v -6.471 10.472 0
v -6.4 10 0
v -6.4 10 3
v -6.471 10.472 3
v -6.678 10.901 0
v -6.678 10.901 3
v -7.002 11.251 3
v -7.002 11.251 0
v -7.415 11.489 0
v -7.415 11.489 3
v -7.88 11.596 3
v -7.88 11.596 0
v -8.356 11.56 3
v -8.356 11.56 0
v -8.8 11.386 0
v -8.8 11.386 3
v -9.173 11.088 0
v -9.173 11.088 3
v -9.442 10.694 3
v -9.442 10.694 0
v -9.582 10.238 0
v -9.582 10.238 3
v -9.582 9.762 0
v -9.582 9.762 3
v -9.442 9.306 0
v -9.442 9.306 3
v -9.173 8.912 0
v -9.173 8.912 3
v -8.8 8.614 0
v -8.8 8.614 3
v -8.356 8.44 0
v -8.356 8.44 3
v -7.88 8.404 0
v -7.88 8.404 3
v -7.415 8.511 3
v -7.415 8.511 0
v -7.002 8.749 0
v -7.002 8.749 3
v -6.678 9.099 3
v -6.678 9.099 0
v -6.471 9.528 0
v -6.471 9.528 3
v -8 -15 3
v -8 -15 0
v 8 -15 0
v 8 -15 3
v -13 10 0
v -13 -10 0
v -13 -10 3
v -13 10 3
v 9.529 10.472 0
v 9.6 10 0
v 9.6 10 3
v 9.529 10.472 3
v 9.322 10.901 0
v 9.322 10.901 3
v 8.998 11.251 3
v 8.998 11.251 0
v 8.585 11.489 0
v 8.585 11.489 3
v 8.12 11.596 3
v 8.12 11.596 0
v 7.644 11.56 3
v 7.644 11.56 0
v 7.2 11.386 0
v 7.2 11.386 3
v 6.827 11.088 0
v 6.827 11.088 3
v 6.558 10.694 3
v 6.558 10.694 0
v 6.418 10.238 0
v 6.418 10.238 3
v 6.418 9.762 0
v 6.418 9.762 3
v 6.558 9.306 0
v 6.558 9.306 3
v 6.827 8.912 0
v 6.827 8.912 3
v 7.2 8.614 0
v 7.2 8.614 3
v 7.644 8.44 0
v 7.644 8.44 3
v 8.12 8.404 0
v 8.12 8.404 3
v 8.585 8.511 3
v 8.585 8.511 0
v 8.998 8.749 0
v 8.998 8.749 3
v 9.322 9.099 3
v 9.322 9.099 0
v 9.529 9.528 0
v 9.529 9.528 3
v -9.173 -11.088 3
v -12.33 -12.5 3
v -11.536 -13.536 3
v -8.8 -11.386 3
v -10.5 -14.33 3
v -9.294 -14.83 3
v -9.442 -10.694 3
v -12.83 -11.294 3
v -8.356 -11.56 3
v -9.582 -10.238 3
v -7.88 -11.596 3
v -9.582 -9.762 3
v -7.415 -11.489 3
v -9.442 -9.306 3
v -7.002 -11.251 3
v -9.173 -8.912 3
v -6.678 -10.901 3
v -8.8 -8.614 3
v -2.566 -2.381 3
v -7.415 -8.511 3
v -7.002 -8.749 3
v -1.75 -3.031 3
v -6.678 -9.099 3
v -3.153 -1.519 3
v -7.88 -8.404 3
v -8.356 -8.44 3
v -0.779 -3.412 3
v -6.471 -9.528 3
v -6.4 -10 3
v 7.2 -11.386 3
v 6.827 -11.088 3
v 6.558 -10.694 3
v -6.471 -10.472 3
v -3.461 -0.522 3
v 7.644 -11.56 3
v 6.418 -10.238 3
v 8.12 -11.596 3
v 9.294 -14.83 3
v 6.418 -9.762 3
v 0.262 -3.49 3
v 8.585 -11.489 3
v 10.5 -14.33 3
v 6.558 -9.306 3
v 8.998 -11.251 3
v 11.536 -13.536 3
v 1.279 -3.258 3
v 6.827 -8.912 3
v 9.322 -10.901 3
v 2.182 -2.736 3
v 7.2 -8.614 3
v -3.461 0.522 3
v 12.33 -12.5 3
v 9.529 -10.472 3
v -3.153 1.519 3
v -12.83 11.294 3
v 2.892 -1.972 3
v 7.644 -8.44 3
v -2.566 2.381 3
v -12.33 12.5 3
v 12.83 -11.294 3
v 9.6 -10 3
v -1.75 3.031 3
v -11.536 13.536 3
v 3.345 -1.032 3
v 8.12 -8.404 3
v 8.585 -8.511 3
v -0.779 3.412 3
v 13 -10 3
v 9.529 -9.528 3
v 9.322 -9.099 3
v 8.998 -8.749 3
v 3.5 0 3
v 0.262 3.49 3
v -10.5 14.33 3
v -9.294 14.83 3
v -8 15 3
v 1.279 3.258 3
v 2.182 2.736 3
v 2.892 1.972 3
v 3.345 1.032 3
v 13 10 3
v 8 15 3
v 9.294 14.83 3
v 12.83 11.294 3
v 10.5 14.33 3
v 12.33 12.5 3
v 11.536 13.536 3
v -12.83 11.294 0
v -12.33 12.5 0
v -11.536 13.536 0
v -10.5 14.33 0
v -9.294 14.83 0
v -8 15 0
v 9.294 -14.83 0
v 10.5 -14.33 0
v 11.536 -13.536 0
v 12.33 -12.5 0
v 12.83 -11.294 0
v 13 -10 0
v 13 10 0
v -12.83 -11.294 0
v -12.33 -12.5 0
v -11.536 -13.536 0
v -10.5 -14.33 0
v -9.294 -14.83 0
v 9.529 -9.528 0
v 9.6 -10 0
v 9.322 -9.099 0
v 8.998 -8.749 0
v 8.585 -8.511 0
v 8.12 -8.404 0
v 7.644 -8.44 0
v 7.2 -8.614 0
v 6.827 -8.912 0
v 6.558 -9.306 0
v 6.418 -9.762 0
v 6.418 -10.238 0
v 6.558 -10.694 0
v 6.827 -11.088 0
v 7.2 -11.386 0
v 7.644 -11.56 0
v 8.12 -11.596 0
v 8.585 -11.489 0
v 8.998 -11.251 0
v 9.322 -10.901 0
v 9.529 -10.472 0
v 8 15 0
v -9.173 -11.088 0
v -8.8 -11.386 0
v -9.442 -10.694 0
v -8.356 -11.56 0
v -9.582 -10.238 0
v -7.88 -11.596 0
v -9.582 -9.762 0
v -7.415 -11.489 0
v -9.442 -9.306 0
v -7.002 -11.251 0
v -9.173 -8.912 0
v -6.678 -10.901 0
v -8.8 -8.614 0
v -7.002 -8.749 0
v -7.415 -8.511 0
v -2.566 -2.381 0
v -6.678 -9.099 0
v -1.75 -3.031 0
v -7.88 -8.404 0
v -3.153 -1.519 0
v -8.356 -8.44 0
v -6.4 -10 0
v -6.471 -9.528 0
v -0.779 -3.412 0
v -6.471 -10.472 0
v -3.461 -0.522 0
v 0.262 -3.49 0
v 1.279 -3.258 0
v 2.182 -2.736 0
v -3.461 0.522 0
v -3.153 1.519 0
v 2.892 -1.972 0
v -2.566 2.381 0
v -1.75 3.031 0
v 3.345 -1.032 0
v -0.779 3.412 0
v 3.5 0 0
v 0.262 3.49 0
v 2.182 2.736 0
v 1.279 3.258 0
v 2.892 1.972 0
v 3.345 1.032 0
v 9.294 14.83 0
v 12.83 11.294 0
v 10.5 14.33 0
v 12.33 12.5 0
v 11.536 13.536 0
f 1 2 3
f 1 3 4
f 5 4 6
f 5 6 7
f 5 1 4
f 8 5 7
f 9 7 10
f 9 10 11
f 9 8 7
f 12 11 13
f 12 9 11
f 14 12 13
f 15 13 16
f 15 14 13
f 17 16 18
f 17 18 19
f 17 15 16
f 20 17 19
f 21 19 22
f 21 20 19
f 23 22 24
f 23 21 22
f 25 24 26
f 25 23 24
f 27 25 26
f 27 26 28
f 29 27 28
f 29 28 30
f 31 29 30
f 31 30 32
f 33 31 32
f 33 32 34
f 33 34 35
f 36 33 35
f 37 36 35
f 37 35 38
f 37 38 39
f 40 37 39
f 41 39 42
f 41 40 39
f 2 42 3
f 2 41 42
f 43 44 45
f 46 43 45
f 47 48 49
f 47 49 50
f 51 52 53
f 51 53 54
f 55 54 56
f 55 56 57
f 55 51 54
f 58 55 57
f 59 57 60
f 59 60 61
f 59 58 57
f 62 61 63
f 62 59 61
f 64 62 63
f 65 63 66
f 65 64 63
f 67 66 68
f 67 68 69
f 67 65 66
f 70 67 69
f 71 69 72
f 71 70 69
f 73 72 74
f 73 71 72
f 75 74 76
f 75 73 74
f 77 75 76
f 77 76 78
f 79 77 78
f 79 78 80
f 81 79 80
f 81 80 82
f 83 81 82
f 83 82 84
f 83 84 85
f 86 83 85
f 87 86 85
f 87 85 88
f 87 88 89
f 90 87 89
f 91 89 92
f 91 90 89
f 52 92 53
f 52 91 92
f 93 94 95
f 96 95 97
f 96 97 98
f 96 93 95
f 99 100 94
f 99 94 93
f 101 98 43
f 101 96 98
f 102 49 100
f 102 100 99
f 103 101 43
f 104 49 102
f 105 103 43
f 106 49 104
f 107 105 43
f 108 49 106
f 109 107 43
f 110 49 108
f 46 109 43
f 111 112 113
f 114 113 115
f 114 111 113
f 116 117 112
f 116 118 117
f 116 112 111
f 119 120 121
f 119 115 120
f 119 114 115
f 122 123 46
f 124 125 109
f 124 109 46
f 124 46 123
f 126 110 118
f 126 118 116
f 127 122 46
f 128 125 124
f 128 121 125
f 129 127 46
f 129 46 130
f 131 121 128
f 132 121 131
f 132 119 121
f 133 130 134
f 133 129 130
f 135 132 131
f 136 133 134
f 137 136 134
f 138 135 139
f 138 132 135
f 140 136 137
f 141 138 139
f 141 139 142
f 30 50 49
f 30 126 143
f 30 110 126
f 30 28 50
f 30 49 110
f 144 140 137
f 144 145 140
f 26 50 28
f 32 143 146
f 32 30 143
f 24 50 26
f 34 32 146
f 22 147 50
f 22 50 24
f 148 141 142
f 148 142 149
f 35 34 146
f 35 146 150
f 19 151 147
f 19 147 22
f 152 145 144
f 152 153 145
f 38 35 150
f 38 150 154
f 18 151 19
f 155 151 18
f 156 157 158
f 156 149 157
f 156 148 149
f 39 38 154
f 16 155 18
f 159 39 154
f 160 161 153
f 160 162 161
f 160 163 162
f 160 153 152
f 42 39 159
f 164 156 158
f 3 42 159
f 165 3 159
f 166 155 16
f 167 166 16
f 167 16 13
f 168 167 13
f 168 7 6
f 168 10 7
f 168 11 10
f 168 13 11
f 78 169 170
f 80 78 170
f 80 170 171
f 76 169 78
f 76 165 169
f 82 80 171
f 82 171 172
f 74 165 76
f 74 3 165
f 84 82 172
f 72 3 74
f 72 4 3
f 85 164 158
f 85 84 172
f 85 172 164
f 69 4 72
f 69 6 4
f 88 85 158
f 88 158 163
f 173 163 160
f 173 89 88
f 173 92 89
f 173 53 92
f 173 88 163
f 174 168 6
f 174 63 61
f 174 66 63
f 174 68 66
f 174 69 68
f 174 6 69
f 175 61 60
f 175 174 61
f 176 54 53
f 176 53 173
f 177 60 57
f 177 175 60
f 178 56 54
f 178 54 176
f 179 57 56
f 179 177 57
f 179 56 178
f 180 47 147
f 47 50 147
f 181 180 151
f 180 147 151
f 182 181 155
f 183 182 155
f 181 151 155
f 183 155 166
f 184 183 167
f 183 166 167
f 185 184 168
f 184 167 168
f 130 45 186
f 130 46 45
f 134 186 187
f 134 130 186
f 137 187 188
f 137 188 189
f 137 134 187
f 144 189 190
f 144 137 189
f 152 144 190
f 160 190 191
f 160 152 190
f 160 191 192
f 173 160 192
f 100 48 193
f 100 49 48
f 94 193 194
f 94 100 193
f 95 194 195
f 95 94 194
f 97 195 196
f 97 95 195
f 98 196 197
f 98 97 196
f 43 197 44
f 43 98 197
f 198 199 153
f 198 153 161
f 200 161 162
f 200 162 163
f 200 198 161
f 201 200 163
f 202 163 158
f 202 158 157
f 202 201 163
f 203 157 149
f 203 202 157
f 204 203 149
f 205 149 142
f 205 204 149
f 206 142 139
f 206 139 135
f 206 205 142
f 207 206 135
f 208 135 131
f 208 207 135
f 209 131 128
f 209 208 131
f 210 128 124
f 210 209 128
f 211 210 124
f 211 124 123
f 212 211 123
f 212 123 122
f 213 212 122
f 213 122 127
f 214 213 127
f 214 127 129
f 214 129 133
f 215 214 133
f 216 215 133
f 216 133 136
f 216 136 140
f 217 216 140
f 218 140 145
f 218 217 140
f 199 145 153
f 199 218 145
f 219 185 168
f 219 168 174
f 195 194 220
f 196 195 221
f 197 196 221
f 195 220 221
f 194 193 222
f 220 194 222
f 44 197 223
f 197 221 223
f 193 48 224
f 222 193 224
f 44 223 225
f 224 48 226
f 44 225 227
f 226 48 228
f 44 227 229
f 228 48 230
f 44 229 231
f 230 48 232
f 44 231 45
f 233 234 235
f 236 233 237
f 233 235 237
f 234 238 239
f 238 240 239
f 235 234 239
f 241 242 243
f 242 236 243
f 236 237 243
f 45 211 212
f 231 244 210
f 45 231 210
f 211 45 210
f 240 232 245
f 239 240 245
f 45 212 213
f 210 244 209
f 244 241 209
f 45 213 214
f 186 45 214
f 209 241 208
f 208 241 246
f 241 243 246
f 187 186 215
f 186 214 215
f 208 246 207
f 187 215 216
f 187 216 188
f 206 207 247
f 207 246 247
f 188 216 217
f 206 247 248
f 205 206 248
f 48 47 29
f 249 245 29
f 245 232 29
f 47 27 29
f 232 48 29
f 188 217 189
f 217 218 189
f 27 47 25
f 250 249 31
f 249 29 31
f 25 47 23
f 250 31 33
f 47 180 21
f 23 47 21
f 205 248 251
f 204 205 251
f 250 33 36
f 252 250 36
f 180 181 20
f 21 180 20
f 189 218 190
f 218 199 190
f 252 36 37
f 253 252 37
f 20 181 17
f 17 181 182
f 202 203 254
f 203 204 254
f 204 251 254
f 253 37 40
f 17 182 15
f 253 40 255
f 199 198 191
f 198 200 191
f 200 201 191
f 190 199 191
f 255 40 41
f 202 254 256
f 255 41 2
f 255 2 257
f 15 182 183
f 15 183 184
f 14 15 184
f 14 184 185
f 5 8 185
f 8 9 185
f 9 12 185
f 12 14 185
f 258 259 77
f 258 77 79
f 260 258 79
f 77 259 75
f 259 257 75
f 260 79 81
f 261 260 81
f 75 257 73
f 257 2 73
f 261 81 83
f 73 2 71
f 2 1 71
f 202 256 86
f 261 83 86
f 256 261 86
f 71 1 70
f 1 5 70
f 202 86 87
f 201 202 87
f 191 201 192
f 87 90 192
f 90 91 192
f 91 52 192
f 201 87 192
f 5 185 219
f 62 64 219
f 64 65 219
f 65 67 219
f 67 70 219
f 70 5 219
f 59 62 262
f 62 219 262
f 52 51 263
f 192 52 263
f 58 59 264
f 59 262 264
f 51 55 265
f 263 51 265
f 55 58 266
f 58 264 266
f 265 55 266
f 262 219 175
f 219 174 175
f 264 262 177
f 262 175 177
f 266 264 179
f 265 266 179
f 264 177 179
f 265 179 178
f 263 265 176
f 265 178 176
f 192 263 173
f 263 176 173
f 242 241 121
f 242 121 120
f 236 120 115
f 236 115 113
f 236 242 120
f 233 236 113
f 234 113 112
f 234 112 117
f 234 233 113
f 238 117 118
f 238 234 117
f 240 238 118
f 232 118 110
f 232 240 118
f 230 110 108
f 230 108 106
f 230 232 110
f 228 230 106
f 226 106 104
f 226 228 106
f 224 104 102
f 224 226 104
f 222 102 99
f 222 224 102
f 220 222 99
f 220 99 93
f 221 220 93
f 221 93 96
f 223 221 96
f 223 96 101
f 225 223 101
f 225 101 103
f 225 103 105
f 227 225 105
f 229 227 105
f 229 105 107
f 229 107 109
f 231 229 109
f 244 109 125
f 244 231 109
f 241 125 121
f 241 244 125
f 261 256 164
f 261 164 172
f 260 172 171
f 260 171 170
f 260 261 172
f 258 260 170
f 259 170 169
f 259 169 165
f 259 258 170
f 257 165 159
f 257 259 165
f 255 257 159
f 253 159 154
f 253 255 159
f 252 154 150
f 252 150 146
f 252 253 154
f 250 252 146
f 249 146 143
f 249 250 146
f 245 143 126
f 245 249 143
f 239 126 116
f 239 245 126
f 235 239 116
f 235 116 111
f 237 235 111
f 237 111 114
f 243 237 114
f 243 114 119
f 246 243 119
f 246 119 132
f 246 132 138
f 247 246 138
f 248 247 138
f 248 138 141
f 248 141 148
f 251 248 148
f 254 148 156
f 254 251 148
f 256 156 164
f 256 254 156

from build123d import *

# Parameters (mm, degrees)
ESBO_O1_W                = 26
ESBO_O1_H                = 30
ESBO_O1_R                = 3.5
ESBO_O1_R_2              = 1.6
RESSALTO_EXTRUS_O1_DEPTH = 3
FILETE1_R                = 5


with BuildPart() as part:
    # Esboço1 → Ressalto-extrusão1 (new body)
    with BuildSketch(Plane.XY):
        Rectangle(ESBO_O1_W, ESBO_O1_H)
        Circle(ESBO_O1_R, mode=Mode.SUBTRACT)
        with Locations((8, 10)):
            Circle(ESBO_O1_R_2, mode=Mode.SUBTRACT)
        with Locations((-8, 10)):
            Circle(ESBO_O1_R_2, mode=Mode.SUBTRACT)
        with Locations((8, -10)):
            Circle(ESBO_O1_R_2, mode=Mode.SUBTRACT)
        with Locations((-8, -10)):
            Circle(ESBO_O1_R_2, mode=Mode.SUBTRACT)
    extrude(amount=RESSALTO_EXTRUS_O1_DEPTH)

    # Filete1
    filete1_edges = [part.edges().sort_by_distance(p)[0] for p in [
        (-13, -15, 1.5),
        (-13, 15, 1.5),
        (13, 15, 1.5),
        (13, -15, 1.5),
    ]]
    fillet(filete1_edges, radius=FILETE1_R)


solid = part.part
